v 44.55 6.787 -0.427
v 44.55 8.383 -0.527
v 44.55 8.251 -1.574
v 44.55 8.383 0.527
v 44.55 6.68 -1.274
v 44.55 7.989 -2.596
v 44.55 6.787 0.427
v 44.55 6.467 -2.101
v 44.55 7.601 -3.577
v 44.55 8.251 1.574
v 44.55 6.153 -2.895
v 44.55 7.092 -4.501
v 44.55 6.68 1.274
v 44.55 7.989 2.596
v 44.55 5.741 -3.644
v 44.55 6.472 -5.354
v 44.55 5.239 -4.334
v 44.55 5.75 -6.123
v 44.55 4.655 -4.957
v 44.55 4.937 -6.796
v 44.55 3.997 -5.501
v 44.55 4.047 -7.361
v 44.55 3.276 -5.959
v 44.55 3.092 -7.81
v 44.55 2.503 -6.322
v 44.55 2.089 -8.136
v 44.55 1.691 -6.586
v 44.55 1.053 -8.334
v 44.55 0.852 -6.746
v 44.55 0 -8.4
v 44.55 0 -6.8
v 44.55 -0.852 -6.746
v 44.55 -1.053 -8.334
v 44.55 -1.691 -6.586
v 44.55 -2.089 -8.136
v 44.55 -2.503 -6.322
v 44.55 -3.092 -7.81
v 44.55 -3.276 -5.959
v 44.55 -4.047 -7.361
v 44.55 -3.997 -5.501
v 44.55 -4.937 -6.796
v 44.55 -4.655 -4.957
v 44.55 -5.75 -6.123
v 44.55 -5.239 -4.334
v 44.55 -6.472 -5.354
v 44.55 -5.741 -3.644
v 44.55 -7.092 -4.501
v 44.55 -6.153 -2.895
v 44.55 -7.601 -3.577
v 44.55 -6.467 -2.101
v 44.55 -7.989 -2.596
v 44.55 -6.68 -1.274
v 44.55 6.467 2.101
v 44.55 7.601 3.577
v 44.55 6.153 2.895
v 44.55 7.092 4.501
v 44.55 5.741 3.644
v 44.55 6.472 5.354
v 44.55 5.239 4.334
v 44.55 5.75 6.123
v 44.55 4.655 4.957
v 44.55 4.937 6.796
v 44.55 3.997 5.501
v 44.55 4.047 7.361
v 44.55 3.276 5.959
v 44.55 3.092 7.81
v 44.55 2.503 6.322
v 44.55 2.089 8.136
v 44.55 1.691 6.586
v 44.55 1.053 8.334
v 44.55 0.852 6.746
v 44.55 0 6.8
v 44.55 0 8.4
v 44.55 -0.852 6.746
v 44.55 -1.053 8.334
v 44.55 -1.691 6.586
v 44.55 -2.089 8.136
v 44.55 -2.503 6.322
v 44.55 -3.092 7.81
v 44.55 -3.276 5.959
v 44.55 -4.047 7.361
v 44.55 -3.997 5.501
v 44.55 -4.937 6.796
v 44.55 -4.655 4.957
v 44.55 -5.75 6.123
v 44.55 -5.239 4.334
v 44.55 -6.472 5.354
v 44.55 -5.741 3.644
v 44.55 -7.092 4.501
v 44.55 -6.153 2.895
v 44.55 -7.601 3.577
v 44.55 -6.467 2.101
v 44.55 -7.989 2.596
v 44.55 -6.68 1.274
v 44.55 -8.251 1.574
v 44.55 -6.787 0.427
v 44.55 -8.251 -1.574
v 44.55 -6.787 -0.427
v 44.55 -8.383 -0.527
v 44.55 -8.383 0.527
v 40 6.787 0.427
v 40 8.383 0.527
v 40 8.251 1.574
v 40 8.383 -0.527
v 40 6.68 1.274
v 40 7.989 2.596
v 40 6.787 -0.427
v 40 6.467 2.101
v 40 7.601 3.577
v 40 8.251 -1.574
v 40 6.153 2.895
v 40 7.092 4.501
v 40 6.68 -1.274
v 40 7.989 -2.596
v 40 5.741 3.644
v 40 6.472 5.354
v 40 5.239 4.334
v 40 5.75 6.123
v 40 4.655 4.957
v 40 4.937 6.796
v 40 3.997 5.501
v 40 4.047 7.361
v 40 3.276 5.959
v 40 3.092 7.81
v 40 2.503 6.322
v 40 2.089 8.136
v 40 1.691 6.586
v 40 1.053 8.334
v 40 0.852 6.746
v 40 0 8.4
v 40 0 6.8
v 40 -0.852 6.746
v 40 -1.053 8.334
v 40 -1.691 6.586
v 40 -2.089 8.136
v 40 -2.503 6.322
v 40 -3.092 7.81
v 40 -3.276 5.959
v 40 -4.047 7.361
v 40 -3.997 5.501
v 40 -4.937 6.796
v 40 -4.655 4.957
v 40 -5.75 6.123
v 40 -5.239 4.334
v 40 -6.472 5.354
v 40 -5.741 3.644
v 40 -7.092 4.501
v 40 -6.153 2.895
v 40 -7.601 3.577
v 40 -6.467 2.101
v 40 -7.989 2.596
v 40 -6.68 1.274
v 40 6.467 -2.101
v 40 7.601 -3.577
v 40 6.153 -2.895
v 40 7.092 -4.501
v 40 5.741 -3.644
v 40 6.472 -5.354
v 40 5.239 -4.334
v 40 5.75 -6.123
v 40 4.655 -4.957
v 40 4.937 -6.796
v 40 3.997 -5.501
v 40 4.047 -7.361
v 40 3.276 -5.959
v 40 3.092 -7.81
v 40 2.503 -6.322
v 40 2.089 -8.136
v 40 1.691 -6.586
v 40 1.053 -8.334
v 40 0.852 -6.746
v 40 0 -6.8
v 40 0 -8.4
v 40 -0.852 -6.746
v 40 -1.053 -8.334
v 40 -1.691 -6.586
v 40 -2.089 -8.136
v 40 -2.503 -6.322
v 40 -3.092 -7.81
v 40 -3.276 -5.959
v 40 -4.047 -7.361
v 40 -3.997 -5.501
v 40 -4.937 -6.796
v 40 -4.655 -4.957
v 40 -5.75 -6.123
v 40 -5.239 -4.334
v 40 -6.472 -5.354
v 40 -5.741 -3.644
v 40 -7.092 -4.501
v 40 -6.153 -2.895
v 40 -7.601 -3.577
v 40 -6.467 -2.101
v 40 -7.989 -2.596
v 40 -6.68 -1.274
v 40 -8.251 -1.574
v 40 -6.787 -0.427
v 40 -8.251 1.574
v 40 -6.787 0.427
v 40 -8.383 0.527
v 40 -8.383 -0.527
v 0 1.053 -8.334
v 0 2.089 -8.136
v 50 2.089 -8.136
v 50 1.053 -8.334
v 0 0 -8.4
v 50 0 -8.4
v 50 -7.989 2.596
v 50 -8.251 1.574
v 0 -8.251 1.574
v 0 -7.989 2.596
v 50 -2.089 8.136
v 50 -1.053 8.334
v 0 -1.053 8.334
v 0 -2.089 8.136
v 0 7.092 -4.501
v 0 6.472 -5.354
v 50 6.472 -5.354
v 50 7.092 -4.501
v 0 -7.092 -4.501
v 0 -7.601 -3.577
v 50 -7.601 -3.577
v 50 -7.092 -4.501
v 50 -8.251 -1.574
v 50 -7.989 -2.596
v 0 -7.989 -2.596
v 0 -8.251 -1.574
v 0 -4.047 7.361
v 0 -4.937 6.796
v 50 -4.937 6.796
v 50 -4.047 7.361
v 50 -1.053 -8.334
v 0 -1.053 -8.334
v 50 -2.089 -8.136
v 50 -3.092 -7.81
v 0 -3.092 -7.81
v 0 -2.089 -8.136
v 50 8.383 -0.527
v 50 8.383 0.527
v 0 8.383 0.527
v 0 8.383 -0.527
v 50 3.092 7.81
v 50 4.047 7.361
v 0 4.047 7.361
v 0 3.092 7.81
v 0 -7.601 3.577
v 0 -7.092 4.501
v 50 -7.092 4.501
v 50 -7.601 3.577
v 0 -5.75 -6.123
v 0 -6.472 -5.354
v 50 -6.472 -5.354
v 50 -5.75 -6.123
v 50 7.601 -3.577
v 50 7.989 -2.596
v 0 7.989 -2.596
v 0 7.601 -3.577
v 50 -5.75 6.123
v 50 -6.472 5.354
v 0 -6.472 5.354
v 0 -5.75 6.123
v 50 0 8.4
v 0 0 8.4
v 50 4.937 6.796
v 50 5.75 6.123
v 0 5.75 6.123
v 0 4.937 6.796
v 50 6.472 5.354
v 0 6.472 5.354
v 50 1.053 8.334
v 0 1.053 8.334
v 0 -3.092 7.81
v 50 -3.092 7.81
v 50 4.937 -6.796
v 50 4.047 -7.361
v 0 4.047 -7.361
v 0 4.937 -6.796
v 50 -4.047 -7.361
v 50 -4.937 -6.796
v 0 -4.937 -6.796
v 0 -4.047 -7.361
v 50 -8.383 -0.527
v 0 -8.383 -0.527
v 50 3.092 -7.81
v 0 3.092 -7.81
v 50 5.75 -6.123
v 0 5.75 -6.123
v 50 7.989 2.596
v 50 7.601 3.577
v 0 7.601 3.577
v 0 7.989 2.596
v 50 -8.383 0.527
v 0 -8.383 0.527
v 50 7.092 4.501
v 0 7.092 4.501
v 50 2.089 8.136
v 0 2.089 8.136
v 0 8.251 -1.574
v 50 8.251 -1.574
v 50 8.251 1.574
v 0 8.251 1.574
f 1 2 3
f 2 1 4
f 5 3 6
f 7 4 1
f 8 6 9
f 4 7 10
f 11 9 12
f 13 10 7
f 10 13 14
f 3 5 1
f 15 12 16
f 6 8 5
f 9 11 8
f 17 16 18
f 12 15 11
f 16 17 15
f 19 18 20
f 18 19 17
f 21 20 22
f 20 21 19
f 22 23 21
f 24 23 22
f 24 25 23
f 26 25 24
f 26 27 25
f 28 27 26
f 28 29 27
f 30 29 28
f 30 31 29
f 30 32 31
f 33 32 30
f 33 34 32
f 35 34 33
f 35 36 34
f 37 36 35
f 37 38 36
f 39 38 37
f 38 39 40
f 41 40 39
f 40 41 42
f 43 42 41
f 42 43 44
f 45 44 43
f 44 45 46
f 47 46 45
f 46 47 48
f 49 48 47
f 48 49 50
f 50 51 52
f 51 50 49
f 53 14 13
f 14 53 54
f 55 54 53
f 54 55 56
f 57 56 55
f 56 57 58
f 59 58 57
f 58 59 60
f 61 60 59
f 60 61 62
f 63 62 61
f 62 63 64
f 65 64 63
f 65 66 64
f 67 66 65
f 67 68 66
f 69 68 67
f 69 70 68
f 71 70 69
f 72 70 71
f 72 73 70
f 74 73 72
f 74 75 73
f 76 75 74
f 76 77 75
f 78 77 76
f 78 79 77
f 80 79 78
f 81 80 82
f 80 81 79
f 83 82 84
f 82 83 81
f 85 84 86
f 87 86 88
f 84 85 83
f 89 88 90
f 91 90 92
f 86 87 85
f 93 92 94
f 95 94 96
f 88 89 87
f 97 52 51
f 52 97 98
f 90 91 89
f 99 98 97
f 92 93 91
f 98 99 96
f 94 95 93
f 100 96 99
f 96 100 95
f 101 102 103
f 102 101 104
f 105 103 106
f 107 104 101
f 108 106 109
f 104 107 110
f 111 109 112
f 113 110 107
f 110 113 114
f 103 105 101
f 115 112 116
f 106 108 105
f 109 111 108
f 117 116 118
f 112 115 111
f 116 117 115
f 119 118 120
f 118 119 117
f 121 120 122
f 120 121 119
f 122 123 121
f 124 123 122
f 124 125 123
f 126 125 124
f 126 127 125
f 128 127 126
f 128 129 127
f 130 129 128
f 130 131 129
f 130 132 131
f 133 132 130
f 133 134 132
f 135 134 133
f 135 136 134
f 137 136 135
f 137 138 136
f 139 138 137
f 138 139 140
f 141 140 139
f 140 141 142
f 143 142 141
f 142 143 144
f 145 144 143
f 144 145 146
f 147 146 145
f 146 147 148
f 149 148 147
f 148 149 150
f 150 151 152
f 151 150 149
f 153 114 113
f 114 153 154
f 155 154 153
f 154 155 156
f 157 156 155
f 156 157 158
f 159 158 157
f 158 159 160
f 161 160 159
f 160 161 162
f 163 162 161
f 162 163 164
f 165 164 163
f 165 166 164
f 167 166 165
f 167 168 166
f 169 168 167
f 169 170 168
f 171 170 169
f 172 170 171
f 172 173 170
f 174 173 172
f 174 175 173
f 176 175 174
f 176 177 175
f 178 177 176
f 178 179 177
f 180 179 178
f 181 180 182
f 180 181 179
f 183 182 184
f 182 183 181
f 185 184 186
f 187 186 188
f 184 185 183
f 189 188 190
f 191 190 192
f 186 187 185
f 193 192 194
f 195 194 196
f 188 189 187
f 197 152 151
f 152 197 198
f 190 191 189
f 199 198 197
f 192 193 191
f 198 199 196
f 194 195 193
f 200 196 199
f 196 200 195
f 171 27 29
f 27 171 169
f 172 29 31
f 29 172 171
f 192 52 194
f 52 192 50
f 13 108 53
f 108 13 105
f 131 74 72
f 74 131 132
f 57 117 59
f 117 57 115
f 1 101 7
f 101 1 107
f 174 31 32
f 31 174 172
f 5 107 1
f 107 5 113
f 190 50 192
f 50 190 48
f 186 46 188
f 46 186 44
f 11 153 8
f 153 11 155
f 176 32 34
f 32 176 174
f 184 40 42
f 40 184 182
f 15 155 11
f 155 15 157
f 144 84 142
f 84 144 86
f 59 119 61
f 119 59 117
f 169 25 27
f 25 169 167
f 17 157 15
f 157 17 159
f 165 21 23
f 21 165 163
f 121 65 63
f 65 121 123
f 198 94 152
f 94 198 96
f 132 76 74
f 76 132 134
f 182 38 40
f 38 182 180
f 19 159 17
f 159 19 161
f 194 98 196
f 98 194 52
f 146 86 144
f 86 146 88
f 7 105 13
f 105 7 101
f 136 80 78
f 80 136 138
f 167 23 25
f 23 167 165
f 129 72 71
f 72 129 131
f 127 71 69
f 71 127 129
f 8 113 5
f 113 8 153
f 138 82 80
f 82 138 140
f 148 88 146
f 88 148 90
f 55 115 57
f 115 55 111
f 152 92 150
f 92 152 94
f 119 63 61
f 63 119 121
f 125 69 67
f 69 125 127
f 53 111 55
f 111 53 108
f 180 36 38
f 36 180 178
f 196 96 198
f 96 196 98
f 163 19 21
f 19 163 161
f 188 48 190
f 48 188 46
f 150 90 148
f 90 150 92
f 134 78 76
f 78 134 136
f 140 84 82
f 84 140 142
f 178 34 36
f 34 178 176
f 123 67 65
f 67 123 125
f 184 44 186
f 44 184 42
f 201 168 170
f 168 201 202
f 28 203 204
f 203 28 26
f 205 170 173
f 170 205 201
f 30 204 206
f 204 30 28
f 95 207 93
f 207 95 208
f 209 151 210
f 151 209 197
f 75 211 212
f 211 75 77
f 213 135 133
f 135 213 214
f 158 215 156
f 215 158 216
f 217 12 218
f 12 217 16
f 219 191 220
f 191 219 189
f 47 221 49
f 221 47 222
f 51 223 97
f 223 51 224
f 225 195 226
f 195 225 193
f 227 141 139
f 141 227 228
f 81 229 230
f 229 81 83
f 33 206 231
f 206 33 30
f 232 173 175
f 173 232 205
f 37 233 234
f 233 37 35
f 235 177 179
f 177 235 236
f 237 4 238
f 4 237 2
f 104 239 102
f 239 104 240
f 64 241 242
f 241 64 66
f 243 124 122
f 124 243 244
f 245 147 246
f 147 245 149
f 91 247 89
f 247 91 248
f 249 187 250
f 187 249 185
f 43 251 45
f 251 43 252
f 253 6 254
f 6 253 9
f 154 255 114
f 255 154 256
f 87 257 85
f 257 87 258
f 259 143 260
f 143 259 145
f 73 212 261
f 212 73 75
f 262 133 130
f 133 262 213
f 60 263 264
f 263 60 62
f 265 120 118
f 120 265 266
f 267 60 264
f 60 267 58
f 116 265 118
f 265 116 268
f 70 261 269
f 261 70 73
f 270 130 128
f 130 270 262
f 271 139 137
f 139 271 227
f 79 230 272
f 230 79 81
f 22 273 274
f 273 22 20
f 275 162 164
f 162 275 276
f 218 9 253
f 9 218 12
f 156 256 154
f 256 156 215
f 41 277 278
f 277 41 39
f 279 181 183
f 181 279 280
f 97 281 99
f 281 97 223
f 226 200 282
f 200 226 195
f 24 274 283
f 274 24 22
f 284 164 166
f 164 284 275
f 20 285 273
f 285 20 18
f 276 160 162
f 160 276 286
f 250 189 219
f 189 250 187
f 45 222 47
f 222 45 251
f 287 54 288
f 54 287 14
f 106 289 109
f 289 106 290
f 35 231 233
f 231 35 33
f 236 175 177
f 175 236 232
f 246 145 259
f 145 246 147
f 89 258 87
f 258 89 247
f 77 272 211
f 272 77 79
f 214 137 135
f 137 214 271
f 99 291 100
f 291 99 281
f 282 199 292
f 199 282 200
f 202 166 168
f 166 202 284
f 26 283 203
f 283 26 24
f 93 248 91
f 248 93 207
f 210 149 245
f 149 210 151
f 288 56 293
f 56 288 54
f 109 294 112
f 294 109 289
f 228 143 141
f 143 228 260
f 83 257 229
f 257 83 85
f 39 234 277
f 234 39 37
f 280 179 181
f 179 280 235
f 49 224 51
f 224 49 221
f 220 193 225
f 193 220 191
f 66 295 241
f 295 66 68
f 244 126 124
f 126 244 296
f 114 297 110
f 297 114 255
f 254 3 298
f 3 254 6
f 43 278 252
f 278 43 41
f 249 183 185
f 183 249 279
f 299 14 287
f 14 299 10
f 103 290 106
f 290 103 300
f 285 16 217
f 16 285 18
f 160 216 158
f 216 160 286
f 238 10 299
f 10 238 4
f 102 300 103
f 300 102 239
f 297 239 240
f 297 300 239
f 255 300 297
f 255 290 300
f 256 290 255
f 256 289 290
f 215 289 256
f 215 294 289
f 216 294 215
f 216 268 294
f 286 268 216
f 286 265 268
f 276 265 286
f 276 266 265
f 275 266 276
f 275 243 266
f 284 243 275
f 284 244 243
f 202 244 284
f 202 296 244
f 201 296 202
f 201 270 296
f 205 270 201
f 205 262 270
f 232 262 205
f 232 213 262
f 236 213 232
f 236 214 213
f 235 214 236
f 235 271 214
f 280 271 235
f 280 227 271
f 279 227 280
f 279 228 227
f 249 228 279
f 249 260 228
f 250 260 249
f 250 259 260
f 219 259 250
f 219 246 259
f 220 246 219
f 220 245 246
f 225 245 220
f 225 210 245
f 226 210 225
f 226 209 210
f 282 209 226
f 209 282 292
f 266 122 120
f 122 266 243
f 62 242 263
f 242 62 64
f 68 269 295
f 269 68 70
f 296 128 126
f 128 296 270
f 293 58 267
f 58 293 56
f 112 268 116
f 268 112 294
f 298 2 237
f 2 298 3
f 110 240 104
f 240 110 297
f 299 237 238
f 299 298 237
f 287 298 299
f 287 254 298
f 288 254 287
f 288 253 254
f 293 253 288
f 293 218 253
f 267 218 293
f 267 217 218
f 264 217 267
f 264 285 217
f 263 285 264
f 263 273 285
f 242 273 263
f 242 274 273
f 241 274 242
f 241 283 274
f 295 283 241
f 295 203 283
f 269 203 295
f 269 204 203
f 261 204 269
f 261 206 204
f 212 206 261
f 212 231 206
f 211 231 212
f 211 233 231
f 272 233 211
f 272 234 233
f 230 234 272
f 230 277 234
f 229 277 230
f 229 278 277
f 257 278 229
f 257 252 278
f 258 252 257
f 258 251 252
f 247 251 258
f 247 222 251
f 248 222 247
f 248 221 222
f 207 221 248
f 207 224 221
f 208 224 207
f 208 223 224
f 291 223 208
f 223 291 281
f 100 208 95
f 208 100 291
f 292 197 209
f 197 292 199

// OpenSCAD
$fn=50;

function HotEndDiam() = 16;
function HotEndRecessDiam() = 7;
function HotEndRecessLength() = 4.55;
function HotEndRecessDepth() = 2;
function HotEndRecessOffset() = 10;
function HotEndLength() = 50;

module HotEnd(ScrewChannel=false,3dPrinterTolerance=.4){
rotate([0,90,0]){
	if(ScrewChannel==false){	
		cylinder(h=HotEndLength(),r=HotEndDiam()/2+3dPrinterTolerance);
	}else{
		difference(){
			cylinder(h=HotEndLength(),r=HotEndDiam()/2+3dPrinterTolerance);
			translate([0,0,HotEndLength()-HotEndRecessOffset()]){
				difference(){
					cylinder(h=HotEndRecessLength(),r=HotEndDiam()/2+1+3dPrinterTolerance);
					cylinder(h=HotEndRecessLength(),r=(HotEndDiam()-HotEndRecessDepth()*2)/2+.4+3dPrinterTolerance);
				}
			}
		}
	}
}
}

HotEnd(true,.4);		
